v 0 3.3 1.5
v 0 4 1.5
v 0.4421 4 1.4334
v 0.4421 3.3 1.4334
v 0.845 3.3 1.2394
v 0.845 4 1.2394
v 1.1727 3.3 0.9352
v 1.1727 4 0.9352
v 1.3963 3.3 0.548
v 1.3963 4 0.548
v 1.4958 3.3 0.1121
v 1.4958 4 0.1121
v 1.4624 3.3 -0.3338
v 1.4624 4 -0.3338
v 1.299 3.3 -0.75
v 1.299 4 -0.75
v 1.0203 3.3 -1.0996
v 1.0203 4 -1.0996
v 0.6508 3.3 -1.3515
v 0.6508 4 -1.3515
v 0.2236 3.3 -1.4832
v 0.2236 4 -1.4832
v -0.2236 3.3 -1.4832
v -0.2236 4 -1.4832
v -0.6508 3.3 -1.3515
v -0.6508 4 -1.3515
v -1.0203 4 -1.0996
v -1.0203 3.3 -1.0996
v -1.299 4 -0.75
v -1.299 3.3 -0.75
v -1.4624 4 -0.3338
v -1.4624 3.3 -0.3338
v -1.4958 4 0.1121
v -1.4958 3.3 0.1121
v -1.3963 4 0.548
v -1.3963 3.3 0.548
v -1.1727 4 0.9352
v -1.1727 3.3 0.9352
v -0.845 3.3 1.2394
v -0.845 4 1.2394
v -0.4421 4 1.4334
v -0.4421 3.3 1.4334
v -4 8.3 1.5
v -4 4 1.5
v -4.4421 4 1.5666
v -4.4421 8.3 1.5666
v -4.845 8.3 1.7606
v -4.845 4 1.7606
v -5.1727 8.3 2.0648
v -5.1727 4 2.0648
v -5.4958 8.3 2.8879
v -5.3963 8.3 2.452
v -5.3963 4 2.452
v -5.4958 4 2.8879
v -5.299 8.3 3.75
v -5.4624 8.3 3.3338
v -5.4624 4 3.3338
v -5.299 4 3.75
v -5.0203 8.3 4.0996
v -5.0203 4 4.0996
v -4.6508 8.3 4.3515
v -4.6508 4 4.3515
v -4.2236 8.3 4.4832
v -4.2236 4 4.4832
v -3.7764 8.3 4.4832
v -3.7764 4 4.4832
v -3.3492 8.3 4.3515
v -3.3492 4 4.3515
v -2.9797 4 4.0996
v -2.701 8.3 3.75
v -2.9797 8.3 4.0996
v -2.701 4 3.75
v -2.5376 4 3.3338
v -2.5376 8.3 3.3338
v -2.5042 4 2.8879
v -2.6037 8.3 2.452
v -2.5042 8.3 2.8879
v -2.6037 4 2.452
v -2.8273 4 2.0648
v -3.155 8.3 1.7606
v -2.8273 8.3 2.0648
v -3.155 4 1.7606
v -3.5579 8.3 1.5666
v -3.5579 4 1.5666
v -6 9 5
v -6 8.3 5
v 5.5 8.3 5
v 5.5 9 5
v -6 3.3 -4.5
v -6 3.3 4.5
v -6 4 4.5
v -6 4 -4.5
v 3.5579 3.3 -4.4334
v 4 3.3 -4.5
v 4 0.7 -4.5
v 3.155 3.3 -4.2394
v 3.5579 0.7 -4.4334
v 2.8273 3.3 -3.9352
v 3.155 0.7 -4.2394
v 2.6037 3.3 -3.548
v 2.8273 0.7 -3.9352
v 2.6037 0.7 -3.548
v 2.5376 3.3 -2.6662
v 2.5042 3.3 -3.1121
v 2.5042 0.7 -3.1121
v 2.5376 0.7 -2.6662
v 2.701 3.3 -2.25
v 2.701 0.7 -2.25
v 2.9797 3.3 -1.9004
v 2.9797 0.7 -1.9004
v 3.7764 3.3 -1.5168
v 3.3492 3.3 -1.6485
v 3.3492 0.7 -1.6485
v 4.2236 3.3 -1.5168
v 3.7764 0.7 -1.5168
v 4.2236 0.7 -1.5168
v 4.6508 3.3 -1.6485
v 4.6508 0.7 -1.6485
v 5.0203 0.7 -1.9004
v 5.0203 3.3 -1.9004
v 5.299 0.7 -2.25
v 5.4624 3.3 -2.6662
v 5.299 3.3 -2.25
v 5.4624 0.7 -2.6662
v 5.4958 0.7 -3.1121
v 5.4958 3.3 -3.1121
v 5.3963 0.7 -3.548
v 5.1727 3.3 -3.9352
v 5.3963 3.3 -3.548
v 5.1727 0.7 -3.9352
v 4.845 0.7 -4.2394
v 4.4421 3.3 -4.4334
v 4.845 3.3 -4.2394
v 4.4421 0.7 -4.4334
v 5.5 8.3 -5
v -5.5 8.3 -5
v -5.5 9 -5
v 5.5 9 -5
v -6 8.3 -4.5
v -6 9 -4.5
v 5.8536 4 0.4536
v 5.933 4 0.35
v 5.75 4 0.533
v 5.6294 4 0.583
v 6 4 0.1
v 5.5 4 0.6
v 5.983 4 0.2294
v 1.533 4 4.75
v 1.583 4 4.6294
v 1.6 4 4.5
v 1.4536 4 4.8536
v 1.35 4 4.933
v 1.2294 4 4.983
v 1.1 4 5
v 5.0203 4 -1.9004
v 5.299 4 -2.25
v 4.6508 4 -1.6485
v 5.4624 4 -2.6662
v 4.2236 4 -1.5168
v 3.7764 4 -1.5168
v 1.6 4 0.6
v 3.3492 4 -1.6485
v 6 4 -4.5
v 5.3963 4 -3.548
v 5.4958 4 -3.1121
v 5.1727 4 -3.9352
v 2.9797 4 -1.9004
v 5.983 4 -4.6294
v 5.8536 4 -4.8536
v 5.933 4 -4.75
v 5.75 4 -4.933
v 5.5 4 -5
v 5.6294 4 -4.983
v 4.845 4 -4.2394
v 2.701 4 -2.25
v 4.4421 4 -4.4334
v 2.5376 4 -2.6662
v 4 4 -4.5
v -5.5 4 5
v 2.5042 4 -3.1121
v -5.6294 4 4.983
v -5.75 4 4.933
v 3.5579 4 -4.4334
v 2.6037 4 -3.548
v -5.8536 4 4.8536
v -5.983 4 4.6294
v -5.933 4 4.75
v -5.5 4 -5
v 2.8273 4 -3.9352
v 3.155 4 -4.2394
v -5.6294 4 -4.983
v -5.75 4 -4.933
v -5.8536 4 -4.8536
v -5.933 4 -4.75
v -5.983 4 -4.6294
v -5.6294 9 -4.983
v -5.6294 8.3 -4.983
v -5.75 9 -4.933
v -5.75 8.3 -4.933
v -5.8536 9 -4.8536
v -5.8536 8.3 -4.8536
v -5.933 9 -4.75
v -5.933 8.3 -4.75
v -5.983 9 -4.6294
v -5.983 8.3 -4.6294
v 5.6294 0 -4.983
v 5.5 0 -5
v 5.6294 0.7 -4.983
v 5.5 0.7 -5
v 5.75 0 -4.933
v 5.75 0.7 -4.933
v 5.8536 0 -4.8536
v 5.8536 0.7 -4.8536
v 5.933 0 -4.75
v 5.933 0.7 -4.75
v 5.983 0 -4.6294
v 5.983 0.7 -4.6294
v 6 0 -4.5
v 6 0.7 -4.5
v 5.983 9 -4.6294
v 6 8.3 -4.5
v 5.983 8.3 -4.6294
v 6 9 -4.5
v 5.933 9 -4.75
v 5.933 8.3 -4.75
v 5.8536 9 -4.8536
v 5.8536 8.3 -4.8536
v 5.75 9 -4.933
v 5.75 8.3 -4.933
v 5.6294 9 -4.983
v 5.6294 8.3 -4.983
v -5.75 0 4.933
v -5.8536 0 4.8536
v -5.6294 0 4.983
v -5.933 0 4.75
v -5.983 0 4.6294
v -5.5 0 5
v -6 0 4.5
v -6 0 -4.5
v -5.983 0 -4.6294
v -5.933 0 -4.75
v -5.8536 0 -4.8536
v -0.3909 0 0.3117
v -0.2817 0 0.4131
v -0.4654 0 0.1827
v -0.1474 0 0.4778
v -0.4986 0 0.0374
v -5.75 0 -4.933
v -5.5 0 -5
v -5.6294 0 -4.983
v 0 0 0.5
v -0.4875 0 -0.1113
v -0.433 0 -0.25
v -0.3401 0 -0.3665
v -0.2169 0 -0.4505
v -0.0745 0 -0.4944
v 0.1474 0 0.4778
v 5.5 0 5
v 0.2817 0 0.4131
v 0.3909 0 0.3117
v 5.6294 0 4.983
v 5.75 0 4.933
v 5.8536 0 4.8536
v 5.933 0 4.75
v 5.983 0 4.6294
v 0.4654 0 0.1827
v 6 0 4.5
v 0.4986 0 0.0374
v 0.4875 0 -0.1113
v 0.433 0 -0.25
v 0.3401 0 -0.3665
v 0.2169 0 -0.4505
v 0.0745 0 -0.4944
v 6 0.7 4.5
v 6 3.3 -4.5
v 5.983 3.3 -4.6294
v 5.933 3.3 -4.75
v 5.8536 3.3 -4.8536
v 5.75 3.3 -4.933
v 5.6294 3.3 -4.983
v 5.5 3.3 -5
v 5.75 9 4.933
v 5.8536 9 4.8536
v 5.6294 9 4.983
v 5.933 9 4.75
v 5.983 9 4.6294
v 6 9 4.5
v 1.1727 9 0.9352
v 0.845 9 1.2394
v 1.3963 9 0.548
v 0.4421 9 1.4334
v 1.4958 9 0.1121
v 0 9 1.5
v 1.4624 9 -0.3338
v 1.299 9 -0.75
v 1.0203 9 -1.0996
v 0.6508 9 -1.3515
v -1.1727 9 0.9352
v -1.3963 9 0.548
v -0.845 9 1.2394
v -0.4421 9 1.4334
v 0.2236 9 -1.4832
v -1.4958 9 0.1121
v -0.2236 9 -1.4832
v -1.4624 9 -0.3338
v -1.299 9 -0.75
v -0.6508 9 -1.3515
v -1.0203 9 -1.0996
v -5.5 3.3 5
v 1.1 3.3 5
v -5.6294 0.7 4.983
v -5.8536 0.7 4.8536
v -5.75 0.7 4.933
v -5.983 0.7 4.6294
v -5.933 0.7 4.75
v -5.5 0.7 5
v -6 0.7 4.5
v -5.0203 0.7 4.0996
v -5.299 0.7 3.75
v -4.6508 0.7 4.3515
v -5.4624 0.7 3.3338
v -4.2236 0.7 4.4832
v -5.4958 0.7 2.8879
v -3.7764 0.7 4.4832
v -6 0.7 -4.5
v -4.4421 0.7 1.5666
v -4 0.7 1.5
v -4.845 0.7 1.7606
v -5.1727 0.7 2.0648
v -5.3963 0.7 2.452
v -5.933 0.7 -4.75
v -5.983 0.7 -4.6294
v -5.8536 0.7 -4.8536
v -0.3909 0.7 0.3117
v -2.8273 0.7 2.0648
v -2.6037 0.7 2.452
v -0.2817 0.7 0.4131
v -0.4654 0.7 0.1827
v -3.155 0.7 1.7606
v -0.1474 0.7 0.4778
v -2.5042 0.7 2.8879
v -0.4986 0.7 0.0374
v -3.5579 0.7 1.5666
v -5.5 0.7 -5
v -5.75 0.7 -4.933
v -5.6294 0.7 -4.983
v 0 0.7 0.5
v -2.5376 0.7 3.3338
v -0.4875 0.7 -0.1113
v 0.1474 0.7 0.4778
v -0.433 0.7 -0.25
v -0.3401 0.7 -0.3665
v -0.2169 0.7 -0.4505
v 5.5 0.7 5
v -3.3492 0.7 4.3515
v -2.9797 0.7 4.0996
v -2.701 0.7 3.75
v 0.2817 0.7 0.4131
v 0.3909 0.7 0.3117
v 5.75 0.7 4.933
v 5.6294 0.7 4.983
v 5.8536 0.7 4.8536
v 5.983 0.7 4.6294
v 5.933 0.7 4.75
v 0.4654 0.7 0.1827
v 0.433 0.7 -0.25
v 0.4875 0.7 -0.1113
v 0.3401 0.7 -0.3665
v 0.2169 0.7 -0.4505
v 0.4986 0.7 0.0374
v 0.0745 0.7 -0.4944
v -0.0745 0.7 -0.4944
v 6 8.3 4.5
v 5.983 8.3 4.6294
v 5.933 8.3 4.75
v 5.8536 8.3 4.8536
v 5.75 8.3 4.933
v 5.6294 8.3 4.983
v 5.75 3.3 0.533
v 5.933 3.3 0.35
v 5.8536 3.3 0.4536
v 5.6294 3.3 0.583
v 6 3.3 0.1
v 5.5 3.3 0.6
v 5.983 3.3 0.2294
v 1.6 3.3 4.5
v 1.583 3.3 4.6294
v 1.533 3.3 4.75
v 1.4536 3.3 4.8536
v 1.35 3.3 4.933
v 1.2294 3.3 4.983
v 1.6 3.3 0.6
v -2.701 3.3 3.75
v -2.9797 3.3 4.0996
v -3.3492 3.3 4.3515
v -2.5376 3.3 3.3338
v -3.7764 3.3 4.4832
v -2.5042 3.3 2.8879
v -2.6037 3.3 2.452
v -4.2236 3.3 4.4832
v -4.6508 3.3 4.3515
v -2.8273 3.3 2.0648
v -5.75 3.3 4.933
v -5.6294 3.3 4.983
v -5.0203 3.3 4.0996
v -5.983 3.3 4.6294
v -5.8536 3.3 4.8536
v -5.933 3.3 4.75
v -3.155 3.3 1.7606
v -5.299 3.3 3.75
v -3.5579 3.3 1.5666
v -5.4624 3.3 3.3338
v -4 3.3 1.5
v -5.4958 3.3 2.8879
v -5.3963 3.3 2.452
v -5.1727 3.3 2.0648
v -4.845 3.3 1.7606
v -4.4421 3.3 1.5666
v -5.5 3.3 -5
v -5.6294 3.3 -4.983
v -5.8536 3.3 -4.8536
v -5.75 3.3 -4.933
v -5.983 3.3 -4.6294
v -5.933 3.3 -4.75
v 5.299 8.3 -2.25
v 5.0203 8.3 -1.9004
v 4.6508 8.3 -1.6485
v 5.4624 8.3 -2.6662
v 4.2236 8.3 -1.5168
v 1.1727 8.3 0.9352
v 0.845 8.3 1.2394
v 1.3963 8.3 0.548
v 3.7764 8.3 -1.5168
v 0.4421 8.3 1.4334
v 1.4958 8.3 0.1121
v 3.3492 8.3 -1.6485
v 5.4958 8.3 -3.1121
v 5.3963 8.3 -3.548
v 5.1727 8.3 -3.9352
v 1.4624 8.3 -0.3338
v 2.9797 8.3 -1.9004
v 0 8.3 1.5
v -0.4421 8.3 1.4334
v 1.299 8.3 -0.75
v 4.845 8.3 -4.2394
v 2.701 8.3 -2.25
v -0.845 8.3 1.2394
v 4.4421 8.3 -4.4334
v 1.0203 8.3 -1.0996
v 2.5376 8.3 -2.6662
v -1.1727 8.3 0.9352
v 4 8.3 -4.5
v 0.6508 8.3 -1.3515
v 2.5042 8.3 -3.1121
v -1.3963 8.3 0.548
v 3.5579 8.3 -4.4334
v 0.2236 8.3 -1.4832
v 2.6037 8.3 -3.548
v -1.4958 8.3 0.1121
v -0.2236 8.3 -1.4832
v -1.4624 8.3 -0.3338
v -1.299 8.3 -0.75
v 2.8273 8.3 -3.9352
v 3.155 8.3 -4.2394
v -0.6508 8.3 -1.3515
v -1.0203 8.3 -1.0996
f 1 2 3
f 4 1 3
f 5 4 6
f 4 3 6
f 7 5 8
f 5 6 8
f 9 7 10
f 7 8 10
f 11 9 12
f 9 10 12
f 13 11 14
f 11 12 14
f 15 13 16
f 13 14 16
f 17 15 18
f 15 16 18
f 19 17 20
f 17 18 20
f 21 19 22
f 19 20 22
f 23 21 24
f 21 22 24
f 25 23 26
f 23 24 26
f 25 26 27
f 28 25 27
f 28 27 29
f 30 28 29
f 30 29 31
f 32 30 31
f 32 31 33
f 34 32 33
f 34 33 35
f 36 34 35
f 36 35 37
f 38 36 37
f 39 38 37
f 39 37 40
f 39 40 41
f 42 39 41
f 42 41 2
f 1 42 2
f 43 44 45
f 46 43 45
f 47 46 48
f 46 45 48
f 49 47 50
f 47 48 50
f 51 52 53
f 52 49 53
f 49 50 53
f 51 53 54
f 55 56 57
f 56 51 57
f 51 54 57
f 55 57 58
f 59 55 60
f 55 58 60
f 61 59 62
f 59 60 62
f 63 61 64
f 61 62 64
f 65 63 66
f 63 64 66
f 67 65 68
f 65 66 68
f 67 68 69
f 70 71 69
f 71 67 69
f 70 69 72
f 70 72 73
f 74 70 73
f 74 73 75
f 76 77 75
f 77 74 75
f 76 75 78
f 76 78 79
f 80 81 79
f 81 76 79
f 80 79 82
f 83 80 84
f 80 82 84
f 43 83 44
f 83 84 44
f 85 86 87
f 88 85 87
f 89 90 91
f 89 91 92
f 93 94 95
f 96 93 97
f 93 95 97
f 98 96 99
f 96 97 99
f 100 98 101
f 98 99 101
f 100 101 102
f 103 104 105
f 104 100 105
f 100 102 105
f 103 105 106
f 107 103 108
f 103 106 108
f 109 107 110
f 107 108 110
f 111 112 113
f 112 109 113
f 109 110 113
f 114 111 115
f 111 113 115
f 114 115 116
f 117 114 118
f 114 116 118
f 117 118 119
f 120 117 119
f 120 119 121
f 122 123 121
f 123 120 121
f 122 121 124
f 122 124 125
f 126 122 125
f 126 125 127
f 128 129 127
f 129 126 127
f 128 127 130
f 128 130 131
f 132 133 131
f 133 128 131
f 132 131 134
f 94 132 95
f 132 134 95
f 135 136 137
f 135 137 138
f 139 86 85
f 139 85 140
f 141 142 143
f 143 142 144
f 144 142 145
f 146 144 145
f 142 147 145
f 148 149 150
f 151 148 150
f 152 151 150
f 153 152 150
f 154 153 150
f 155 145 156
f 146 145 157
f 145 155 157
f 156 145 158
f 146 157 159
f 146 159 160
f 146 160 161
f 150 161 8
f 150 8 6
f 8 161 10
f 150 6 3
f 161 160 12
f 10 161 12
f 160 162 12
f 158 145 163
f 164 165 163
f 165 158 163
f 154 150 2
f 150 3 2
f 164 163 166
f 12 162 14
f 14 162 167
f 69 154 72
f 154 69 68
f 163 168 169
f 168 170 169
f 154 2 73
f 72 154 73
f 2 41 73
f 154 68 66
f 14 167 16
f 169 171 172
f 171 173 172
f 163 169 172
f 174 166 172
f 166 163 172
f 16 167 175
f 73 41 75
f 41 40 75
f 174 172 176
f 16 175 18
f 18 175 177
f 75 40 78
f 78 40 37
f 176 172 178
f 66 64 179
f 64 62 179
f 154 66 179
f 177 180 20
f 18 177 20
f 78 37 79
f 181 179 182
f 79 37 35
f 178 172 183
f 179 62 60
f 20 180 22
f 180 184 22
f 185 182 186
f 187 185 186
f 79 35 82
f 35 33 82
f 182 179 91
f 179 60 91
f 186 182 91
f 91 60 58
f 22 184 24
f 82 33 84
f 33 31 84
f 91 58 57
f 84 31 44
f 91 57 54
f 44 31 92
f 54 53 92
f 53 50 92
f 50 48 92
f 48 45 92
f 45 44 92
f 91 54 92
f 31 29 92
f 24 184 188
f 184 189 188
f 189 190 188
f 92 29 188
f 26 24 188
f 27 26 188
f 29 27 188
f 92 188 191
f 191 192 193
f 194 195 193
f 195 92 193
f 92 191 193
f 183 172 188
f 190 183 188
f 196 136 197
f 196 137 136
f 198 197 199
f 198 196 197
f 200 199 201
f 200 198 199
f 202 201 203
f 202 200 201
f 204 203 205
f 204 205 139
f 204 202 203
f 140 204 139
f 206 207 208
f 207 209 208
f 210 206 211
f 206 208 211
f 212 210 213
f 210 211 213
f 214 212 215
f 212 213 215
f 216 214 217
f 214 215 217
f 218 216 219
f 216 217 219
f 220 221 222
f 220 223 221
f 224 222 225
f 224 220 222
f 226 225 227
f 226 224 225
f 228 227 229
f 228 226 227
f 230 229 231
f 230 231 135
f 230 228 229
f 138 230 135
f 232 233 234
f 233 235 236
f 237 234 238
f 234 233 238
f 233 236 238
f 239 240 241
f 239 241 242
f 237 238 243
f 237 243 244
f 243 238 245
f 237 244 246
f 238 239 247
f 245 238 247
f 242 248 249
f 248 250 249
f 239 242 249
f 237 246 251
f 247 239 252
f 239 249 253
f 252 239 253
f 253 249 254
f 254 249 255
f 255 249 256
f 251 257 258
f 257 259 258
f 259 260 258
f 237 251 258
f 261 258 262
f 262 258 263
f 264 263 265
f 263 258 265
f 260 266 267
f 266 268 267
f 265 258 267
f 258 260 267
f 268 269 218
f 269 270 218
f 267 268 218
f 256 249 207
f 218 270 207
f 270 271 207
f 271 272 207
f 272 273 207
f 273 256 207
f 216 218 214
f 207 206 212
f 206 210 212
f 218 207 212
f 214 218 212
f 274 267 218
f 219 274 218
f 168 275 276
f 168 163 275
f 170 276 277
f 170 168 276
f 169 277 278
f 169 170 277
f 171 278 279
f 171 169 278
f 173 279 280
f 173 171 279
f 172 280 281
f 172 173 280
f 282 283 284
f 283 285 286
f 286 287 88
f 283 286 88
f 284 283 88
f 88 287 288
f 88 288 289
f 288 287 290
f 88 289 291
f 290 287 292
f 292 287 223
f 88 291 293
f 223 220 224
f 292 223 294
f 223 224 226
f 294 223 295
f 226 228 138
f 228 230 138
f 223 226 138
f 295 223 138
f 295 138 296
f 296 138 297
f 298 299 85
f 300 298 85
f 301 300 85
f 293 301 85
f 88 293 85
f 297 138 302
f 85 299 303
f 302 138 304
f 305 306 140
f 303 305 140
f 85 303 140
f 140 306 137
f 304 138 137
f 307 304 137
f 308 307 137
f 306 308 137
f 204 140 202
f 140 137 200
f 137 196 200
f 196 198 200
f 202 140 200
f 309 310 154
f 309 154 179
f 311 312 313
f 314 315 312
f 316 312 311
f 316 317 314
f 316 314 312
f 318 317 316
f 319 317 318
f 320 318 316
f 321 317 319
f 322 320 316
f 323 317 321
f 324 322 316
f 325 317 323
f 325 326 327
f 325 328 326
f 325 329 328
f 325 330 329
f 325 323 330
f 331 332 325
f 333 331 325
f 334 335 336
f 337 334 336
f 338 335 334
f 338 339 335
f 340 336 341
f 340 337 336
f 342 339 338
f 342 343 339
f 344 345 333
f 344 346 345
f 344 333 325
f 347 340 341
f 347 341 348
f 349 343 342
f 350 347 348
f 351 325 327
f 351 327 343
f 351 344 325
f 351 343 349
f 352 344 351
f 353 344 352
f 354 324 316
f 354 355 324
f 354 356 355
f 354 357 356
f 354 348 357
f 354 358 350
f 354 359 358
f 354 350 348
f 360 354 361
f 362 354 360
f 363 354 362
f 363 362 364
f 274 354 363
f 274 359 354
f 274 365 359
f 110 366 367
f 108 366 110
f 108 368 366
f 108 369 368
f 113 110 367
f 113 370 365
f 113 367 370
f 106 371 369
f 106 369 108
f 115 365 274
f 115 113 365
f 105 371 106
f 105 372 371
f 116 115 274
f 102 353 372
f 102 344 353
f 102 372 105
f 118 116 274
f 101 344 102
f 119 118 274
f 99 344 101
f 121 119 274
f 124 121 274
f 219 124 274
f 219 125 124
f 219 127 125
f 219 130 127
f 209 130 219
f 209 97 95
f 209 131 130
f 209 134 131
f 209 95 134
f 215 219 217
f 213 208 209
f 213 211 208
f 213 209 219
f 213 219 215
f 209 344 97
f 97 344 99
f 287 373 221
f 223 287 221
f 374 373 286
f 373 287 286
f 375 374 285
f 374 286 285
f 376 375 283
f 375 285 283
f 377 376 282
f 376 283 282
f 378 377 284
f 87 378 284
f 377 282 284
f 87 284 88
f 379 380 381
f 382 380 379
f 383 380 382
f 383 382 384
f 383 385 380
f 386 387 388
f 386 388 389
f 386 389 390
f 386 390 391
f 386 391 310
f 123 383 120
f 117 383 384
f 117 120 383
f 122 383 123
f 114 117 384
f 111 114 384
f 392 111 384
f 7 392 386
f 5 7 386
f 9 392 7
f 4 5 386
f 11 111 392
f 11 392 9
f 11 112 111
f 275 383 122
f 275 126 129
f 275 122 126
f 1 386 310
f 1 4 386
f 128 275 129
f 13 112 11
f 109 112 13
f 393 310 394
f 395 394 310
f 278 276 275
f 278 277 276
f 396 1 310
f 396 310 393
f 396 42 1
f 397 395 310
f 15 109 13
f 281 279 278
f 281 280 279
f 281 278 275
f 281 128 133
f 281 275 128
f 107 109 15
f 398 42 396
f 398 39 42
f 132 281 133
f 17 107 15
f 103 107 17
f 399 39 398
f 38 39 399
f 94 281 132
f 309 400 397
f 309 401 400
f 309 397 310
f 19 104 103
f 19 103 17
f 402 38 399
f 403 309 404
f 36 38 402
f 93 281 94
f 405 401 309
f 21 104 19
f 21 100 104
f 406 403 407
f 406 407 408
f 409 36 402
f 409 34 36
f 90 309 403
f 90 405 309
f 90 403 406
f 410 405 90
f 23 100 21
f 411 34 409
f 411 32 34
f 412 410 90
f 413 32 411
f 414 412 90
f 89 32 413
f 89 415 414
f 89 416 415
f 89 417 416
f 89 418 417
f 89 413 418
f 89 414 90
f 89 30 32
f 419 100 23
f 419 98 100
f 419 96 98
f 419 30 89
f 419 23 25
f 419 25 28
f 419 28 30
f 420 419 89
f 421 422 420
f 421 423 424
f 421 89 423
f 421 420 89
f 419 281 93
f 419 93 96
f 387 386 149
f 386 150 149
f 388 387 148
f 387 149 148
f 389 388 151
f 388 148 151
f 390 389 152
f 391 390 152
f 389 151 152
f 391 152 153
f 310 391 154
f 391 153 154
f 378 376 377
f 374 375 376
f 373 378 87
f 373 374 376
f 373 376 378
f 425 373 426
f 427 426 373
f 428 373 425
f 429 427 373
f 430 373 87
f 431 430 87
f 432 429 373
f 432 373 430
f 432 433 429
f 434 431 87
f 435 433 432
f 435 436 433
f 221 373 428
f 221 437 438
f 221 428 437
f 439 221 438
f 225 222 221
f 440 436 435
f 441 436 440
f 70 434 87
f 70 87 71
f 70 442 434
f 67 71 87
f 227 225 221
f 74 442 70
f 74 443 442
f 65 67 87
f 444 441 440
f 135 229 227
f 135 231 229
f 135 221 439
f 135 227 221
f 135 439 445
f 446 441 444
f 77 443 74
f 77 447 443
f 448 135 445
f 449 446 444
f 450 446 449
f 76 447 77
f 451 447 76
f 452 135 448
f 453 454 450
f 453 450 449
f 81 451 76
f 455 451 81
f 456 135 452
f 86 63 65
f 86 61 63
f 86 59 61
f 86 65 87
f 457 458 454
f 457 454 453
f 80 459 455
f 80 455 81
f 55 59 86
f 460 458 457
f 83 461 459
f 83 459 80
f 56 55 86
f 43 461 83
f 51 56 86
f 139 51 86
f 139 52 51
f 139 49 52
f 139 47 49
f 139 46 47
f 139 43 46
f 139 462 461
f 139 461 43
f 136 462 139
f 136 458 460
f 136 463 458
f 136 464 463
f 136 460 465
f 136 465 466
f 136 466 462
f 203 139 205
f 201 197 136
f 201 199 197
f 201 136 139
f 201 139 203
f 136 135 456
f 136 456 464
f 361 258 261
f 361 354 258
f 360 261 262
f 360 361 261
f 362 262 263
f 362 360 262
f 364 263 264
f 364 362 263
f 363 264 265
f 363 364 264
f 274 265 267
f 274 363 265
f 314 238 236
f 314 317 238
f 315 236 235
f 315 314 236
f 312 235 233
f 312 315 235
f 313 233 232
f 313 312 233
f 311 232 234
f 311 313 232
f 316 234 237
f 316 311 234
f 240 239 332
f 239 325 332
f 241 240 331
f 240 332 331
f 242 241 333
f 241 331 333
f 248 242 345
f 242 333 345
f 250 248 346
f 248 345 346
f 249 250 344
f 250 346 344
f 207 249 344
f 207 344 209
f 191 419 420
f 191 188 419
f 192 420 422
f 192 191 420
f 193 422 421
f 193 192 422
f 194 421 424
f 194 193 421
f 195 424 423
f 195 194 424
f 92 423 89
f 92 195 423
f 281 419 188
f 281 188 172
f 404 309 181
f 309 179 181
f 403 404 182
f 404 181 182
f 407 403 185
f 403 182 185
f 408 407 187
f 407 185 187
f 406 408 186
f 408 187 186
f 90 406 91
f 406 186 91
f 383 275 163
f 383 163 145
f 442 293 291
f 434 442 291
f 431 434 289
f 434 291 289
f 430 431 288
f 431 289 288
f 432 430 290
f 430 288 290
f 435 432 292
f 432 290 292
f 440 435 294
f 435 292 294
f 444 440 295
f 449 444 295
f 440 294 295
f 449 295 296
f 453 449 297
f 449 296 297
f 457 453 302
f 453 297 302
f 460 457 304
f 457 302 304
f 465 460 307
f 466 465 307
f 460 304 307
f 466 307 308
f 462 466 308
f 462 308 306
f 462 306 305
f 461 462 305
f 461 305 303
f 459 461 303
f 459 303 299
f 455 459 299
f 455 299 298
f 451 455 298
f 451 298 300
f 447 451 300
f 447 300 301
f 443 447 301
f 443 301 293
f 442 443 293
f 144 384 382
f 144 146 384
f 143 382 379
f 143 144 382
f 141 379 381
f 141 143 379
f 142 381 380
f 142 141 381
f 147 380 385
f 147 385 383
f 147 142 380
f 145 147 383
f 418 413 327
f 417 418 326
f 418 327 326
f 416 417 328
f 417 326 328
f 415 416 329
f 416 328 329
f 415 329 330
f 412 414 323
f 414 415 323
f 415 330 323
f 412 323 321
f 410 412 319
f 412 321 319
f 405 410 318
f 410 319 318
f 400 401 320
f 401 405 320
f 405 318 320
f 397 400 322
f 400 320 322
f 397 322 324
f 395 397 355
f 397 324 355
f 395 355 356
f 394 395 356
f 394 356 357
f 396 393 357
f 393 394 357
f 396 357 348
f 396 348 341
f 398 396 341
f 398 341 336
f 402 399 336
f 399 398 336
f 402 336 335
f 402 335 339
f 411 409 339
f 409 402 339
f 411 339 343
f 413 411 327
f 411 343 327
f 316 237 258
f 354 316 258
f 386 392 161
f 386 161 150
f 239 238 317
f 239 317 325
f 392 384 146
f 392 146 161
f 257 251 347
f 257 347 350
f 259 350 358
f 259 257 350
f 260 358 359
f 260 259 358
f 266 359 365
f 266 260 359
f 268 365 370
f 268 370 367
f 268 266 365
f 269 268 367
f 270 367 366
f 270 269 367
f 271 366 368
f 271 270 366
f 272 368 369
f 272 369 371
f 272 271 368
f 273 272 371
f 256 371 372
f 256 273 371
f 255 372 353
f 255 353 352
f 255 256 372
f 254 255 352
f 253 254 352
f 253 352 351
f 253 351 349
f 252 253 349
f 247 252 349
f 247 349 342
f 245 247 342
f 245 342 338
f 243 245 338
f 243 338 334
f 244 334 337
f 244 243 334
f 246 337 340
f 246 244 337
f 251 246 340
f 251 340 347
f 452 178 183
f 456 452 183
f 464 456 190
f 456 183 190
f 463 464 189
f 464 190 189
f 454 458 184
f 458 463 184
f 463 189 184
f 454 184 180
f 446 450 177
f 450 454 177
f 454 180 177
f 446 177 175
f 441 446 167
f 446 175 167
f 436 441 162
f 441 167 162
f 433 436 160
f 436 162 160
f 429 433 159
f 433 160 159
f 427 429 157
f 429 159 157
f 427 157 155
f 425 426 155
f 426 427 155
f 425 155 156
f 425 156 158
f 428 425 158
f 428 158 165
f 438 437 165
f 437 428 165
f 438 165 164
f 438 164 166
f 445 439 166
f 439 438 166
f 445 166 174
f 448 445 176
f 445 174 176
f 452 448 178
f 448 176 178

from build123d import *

# Parameters (mm, degrees)
CROQUIS1_W              = 12
CROQUIS1_H              = 10
CROQUIS1_R              = 0.5
SALIENTE_EXTRUIR1_DEPTH = 0.7
CROQUIS2_R              = 1.5
SALIENTE_EXTRUIR2_DEPTH = 8.3
SALIENTE_EXTRUIR3_DEPTH = 0.7
SALIENTE_EXTRUIR4_DEPTH = 0.7
CORTAR_EXTRUIR1_REACH   = 13.916
CROQUIS5_R              = 1.5
REDONDEO1_R             = 0.5


with BuildPart() as part:
    # Croquis1 → Saliente-Extruir1 (new body)
    with BuildSketch(Plane(origin=(0, 0, 0), x_dir=(1, 0, 0), z_dir=(0, 1, 0))):
        Rectangle(CROQUIS1_W, CROQUIS1_H)
        with Locations(Location((0, 0, 0), (0, 0, 270))):
            Circle(CROQUIS1_R, mode=Mode.SUBTRACT)
    extrude(amount=SALIENTE_EXTRUIR1_DEPTH)

    # Croquis2 → Saliente-Extruir2 (add)
    with BuildSketch(Plane(origin=(0, 0.7, 0), x_dir=(1, 0, 0), z_dir=(0, 1, 0))):
        with Locations(Location((4, 3, 0), (0, 0, 90))):
            Circle(CROQUIS2_R)
        with Locations(Location((-4, -3, 0), (0, 0, 90))):
            Circle(CROQUIS2_R)
    extrude(amount=SALIENTE_EXTRUIR2_DEPTH)

    # Croquis3 → Saliente-Extruir3 (add)
    with BuildSketch(Plane(origin=(0, 3.3, 0), x_dir=(1, 0, 0), z_dir=(0, 1, 0))):
        Polygon((6, -0.6), (1.6, -0.6), (1.6, -5), (-6, -5), (-6, 5), (6, 5), align=None)
    extrude(amount=SALIENTE_EXTRUIR3_DEPTH)

    # Croquis4 → Saliente-Extruir4 (add)
    with BuildSketch(Plane(origin=(0, 8.3, 0), x_dir=(1, 0, 0), z_dir=(0, 1, 0))):
        Polygon((6, -0.6), (6, -5), (1.6, -5), (-6, -5), (-6, 5), (6, 5), align=None)
    extrude(amount=SALIENTE_EXTRUIR4_DEPTH)

    # Cortar-Extruir1: up to this face of the body (flat: up to its plane)
    cortar_extruir1_end = Plane(part.part.faces().sort_by_distance((-0.850469255, 3.3, -0.626661556))[0])
    # Croquis5 → Cortar-Extruir1 (cut, up to the picked face)
    with BuildSketch(Plane(origin=(0, 9, 0), x_dir=(1, 0, 0), z_dir=(0, 1, 0)), mode=Mode.PRIVATE) as cortar_extruir1_sk1:
        with Locations(Location((0, 0, 0), (0, 0, 270))):
            Circle(CROQUIS5_R)
    cortar_extruir1_tool1 = split(extrude(cortar_extruir1_sk1.sketch, amount=-CORTAR_EXTRUIR1_REACH, mode=Mode.PRIVATE), bisect_by=cortar_extruir1_end, keep=Keep.BOTH, mode=Mode.PRIVATE)
    add(cortar_extruir1_tool1.solids().sort_by(Axis((0, 9, 0), (0, -1, 0)))[0], mode=Mode.SUBTRACT)

    # Redondeo1
    redondeo1_edges = [part.edges().sort_by_distance(p)[0] for p in [
        (6, 3.65, -5),
        (-6, 3.65, -5),
        (-6, 3.65, 5),
        (1.6, 3.65, 5),
        (6, 3.65, 0.6),
        (6, 8.65, -5),
        (-6, 8.65, -5),
        (6, 8.65, 5),
        (6, 0.35, 5),
        (-6, 0.35, 5),
        (-6, 0.35, -5),
        (6, 0.35, -5),
    ]]
    fillet(redondeo1_edges, radius=REDONDEO1_R)


solid = part.part
